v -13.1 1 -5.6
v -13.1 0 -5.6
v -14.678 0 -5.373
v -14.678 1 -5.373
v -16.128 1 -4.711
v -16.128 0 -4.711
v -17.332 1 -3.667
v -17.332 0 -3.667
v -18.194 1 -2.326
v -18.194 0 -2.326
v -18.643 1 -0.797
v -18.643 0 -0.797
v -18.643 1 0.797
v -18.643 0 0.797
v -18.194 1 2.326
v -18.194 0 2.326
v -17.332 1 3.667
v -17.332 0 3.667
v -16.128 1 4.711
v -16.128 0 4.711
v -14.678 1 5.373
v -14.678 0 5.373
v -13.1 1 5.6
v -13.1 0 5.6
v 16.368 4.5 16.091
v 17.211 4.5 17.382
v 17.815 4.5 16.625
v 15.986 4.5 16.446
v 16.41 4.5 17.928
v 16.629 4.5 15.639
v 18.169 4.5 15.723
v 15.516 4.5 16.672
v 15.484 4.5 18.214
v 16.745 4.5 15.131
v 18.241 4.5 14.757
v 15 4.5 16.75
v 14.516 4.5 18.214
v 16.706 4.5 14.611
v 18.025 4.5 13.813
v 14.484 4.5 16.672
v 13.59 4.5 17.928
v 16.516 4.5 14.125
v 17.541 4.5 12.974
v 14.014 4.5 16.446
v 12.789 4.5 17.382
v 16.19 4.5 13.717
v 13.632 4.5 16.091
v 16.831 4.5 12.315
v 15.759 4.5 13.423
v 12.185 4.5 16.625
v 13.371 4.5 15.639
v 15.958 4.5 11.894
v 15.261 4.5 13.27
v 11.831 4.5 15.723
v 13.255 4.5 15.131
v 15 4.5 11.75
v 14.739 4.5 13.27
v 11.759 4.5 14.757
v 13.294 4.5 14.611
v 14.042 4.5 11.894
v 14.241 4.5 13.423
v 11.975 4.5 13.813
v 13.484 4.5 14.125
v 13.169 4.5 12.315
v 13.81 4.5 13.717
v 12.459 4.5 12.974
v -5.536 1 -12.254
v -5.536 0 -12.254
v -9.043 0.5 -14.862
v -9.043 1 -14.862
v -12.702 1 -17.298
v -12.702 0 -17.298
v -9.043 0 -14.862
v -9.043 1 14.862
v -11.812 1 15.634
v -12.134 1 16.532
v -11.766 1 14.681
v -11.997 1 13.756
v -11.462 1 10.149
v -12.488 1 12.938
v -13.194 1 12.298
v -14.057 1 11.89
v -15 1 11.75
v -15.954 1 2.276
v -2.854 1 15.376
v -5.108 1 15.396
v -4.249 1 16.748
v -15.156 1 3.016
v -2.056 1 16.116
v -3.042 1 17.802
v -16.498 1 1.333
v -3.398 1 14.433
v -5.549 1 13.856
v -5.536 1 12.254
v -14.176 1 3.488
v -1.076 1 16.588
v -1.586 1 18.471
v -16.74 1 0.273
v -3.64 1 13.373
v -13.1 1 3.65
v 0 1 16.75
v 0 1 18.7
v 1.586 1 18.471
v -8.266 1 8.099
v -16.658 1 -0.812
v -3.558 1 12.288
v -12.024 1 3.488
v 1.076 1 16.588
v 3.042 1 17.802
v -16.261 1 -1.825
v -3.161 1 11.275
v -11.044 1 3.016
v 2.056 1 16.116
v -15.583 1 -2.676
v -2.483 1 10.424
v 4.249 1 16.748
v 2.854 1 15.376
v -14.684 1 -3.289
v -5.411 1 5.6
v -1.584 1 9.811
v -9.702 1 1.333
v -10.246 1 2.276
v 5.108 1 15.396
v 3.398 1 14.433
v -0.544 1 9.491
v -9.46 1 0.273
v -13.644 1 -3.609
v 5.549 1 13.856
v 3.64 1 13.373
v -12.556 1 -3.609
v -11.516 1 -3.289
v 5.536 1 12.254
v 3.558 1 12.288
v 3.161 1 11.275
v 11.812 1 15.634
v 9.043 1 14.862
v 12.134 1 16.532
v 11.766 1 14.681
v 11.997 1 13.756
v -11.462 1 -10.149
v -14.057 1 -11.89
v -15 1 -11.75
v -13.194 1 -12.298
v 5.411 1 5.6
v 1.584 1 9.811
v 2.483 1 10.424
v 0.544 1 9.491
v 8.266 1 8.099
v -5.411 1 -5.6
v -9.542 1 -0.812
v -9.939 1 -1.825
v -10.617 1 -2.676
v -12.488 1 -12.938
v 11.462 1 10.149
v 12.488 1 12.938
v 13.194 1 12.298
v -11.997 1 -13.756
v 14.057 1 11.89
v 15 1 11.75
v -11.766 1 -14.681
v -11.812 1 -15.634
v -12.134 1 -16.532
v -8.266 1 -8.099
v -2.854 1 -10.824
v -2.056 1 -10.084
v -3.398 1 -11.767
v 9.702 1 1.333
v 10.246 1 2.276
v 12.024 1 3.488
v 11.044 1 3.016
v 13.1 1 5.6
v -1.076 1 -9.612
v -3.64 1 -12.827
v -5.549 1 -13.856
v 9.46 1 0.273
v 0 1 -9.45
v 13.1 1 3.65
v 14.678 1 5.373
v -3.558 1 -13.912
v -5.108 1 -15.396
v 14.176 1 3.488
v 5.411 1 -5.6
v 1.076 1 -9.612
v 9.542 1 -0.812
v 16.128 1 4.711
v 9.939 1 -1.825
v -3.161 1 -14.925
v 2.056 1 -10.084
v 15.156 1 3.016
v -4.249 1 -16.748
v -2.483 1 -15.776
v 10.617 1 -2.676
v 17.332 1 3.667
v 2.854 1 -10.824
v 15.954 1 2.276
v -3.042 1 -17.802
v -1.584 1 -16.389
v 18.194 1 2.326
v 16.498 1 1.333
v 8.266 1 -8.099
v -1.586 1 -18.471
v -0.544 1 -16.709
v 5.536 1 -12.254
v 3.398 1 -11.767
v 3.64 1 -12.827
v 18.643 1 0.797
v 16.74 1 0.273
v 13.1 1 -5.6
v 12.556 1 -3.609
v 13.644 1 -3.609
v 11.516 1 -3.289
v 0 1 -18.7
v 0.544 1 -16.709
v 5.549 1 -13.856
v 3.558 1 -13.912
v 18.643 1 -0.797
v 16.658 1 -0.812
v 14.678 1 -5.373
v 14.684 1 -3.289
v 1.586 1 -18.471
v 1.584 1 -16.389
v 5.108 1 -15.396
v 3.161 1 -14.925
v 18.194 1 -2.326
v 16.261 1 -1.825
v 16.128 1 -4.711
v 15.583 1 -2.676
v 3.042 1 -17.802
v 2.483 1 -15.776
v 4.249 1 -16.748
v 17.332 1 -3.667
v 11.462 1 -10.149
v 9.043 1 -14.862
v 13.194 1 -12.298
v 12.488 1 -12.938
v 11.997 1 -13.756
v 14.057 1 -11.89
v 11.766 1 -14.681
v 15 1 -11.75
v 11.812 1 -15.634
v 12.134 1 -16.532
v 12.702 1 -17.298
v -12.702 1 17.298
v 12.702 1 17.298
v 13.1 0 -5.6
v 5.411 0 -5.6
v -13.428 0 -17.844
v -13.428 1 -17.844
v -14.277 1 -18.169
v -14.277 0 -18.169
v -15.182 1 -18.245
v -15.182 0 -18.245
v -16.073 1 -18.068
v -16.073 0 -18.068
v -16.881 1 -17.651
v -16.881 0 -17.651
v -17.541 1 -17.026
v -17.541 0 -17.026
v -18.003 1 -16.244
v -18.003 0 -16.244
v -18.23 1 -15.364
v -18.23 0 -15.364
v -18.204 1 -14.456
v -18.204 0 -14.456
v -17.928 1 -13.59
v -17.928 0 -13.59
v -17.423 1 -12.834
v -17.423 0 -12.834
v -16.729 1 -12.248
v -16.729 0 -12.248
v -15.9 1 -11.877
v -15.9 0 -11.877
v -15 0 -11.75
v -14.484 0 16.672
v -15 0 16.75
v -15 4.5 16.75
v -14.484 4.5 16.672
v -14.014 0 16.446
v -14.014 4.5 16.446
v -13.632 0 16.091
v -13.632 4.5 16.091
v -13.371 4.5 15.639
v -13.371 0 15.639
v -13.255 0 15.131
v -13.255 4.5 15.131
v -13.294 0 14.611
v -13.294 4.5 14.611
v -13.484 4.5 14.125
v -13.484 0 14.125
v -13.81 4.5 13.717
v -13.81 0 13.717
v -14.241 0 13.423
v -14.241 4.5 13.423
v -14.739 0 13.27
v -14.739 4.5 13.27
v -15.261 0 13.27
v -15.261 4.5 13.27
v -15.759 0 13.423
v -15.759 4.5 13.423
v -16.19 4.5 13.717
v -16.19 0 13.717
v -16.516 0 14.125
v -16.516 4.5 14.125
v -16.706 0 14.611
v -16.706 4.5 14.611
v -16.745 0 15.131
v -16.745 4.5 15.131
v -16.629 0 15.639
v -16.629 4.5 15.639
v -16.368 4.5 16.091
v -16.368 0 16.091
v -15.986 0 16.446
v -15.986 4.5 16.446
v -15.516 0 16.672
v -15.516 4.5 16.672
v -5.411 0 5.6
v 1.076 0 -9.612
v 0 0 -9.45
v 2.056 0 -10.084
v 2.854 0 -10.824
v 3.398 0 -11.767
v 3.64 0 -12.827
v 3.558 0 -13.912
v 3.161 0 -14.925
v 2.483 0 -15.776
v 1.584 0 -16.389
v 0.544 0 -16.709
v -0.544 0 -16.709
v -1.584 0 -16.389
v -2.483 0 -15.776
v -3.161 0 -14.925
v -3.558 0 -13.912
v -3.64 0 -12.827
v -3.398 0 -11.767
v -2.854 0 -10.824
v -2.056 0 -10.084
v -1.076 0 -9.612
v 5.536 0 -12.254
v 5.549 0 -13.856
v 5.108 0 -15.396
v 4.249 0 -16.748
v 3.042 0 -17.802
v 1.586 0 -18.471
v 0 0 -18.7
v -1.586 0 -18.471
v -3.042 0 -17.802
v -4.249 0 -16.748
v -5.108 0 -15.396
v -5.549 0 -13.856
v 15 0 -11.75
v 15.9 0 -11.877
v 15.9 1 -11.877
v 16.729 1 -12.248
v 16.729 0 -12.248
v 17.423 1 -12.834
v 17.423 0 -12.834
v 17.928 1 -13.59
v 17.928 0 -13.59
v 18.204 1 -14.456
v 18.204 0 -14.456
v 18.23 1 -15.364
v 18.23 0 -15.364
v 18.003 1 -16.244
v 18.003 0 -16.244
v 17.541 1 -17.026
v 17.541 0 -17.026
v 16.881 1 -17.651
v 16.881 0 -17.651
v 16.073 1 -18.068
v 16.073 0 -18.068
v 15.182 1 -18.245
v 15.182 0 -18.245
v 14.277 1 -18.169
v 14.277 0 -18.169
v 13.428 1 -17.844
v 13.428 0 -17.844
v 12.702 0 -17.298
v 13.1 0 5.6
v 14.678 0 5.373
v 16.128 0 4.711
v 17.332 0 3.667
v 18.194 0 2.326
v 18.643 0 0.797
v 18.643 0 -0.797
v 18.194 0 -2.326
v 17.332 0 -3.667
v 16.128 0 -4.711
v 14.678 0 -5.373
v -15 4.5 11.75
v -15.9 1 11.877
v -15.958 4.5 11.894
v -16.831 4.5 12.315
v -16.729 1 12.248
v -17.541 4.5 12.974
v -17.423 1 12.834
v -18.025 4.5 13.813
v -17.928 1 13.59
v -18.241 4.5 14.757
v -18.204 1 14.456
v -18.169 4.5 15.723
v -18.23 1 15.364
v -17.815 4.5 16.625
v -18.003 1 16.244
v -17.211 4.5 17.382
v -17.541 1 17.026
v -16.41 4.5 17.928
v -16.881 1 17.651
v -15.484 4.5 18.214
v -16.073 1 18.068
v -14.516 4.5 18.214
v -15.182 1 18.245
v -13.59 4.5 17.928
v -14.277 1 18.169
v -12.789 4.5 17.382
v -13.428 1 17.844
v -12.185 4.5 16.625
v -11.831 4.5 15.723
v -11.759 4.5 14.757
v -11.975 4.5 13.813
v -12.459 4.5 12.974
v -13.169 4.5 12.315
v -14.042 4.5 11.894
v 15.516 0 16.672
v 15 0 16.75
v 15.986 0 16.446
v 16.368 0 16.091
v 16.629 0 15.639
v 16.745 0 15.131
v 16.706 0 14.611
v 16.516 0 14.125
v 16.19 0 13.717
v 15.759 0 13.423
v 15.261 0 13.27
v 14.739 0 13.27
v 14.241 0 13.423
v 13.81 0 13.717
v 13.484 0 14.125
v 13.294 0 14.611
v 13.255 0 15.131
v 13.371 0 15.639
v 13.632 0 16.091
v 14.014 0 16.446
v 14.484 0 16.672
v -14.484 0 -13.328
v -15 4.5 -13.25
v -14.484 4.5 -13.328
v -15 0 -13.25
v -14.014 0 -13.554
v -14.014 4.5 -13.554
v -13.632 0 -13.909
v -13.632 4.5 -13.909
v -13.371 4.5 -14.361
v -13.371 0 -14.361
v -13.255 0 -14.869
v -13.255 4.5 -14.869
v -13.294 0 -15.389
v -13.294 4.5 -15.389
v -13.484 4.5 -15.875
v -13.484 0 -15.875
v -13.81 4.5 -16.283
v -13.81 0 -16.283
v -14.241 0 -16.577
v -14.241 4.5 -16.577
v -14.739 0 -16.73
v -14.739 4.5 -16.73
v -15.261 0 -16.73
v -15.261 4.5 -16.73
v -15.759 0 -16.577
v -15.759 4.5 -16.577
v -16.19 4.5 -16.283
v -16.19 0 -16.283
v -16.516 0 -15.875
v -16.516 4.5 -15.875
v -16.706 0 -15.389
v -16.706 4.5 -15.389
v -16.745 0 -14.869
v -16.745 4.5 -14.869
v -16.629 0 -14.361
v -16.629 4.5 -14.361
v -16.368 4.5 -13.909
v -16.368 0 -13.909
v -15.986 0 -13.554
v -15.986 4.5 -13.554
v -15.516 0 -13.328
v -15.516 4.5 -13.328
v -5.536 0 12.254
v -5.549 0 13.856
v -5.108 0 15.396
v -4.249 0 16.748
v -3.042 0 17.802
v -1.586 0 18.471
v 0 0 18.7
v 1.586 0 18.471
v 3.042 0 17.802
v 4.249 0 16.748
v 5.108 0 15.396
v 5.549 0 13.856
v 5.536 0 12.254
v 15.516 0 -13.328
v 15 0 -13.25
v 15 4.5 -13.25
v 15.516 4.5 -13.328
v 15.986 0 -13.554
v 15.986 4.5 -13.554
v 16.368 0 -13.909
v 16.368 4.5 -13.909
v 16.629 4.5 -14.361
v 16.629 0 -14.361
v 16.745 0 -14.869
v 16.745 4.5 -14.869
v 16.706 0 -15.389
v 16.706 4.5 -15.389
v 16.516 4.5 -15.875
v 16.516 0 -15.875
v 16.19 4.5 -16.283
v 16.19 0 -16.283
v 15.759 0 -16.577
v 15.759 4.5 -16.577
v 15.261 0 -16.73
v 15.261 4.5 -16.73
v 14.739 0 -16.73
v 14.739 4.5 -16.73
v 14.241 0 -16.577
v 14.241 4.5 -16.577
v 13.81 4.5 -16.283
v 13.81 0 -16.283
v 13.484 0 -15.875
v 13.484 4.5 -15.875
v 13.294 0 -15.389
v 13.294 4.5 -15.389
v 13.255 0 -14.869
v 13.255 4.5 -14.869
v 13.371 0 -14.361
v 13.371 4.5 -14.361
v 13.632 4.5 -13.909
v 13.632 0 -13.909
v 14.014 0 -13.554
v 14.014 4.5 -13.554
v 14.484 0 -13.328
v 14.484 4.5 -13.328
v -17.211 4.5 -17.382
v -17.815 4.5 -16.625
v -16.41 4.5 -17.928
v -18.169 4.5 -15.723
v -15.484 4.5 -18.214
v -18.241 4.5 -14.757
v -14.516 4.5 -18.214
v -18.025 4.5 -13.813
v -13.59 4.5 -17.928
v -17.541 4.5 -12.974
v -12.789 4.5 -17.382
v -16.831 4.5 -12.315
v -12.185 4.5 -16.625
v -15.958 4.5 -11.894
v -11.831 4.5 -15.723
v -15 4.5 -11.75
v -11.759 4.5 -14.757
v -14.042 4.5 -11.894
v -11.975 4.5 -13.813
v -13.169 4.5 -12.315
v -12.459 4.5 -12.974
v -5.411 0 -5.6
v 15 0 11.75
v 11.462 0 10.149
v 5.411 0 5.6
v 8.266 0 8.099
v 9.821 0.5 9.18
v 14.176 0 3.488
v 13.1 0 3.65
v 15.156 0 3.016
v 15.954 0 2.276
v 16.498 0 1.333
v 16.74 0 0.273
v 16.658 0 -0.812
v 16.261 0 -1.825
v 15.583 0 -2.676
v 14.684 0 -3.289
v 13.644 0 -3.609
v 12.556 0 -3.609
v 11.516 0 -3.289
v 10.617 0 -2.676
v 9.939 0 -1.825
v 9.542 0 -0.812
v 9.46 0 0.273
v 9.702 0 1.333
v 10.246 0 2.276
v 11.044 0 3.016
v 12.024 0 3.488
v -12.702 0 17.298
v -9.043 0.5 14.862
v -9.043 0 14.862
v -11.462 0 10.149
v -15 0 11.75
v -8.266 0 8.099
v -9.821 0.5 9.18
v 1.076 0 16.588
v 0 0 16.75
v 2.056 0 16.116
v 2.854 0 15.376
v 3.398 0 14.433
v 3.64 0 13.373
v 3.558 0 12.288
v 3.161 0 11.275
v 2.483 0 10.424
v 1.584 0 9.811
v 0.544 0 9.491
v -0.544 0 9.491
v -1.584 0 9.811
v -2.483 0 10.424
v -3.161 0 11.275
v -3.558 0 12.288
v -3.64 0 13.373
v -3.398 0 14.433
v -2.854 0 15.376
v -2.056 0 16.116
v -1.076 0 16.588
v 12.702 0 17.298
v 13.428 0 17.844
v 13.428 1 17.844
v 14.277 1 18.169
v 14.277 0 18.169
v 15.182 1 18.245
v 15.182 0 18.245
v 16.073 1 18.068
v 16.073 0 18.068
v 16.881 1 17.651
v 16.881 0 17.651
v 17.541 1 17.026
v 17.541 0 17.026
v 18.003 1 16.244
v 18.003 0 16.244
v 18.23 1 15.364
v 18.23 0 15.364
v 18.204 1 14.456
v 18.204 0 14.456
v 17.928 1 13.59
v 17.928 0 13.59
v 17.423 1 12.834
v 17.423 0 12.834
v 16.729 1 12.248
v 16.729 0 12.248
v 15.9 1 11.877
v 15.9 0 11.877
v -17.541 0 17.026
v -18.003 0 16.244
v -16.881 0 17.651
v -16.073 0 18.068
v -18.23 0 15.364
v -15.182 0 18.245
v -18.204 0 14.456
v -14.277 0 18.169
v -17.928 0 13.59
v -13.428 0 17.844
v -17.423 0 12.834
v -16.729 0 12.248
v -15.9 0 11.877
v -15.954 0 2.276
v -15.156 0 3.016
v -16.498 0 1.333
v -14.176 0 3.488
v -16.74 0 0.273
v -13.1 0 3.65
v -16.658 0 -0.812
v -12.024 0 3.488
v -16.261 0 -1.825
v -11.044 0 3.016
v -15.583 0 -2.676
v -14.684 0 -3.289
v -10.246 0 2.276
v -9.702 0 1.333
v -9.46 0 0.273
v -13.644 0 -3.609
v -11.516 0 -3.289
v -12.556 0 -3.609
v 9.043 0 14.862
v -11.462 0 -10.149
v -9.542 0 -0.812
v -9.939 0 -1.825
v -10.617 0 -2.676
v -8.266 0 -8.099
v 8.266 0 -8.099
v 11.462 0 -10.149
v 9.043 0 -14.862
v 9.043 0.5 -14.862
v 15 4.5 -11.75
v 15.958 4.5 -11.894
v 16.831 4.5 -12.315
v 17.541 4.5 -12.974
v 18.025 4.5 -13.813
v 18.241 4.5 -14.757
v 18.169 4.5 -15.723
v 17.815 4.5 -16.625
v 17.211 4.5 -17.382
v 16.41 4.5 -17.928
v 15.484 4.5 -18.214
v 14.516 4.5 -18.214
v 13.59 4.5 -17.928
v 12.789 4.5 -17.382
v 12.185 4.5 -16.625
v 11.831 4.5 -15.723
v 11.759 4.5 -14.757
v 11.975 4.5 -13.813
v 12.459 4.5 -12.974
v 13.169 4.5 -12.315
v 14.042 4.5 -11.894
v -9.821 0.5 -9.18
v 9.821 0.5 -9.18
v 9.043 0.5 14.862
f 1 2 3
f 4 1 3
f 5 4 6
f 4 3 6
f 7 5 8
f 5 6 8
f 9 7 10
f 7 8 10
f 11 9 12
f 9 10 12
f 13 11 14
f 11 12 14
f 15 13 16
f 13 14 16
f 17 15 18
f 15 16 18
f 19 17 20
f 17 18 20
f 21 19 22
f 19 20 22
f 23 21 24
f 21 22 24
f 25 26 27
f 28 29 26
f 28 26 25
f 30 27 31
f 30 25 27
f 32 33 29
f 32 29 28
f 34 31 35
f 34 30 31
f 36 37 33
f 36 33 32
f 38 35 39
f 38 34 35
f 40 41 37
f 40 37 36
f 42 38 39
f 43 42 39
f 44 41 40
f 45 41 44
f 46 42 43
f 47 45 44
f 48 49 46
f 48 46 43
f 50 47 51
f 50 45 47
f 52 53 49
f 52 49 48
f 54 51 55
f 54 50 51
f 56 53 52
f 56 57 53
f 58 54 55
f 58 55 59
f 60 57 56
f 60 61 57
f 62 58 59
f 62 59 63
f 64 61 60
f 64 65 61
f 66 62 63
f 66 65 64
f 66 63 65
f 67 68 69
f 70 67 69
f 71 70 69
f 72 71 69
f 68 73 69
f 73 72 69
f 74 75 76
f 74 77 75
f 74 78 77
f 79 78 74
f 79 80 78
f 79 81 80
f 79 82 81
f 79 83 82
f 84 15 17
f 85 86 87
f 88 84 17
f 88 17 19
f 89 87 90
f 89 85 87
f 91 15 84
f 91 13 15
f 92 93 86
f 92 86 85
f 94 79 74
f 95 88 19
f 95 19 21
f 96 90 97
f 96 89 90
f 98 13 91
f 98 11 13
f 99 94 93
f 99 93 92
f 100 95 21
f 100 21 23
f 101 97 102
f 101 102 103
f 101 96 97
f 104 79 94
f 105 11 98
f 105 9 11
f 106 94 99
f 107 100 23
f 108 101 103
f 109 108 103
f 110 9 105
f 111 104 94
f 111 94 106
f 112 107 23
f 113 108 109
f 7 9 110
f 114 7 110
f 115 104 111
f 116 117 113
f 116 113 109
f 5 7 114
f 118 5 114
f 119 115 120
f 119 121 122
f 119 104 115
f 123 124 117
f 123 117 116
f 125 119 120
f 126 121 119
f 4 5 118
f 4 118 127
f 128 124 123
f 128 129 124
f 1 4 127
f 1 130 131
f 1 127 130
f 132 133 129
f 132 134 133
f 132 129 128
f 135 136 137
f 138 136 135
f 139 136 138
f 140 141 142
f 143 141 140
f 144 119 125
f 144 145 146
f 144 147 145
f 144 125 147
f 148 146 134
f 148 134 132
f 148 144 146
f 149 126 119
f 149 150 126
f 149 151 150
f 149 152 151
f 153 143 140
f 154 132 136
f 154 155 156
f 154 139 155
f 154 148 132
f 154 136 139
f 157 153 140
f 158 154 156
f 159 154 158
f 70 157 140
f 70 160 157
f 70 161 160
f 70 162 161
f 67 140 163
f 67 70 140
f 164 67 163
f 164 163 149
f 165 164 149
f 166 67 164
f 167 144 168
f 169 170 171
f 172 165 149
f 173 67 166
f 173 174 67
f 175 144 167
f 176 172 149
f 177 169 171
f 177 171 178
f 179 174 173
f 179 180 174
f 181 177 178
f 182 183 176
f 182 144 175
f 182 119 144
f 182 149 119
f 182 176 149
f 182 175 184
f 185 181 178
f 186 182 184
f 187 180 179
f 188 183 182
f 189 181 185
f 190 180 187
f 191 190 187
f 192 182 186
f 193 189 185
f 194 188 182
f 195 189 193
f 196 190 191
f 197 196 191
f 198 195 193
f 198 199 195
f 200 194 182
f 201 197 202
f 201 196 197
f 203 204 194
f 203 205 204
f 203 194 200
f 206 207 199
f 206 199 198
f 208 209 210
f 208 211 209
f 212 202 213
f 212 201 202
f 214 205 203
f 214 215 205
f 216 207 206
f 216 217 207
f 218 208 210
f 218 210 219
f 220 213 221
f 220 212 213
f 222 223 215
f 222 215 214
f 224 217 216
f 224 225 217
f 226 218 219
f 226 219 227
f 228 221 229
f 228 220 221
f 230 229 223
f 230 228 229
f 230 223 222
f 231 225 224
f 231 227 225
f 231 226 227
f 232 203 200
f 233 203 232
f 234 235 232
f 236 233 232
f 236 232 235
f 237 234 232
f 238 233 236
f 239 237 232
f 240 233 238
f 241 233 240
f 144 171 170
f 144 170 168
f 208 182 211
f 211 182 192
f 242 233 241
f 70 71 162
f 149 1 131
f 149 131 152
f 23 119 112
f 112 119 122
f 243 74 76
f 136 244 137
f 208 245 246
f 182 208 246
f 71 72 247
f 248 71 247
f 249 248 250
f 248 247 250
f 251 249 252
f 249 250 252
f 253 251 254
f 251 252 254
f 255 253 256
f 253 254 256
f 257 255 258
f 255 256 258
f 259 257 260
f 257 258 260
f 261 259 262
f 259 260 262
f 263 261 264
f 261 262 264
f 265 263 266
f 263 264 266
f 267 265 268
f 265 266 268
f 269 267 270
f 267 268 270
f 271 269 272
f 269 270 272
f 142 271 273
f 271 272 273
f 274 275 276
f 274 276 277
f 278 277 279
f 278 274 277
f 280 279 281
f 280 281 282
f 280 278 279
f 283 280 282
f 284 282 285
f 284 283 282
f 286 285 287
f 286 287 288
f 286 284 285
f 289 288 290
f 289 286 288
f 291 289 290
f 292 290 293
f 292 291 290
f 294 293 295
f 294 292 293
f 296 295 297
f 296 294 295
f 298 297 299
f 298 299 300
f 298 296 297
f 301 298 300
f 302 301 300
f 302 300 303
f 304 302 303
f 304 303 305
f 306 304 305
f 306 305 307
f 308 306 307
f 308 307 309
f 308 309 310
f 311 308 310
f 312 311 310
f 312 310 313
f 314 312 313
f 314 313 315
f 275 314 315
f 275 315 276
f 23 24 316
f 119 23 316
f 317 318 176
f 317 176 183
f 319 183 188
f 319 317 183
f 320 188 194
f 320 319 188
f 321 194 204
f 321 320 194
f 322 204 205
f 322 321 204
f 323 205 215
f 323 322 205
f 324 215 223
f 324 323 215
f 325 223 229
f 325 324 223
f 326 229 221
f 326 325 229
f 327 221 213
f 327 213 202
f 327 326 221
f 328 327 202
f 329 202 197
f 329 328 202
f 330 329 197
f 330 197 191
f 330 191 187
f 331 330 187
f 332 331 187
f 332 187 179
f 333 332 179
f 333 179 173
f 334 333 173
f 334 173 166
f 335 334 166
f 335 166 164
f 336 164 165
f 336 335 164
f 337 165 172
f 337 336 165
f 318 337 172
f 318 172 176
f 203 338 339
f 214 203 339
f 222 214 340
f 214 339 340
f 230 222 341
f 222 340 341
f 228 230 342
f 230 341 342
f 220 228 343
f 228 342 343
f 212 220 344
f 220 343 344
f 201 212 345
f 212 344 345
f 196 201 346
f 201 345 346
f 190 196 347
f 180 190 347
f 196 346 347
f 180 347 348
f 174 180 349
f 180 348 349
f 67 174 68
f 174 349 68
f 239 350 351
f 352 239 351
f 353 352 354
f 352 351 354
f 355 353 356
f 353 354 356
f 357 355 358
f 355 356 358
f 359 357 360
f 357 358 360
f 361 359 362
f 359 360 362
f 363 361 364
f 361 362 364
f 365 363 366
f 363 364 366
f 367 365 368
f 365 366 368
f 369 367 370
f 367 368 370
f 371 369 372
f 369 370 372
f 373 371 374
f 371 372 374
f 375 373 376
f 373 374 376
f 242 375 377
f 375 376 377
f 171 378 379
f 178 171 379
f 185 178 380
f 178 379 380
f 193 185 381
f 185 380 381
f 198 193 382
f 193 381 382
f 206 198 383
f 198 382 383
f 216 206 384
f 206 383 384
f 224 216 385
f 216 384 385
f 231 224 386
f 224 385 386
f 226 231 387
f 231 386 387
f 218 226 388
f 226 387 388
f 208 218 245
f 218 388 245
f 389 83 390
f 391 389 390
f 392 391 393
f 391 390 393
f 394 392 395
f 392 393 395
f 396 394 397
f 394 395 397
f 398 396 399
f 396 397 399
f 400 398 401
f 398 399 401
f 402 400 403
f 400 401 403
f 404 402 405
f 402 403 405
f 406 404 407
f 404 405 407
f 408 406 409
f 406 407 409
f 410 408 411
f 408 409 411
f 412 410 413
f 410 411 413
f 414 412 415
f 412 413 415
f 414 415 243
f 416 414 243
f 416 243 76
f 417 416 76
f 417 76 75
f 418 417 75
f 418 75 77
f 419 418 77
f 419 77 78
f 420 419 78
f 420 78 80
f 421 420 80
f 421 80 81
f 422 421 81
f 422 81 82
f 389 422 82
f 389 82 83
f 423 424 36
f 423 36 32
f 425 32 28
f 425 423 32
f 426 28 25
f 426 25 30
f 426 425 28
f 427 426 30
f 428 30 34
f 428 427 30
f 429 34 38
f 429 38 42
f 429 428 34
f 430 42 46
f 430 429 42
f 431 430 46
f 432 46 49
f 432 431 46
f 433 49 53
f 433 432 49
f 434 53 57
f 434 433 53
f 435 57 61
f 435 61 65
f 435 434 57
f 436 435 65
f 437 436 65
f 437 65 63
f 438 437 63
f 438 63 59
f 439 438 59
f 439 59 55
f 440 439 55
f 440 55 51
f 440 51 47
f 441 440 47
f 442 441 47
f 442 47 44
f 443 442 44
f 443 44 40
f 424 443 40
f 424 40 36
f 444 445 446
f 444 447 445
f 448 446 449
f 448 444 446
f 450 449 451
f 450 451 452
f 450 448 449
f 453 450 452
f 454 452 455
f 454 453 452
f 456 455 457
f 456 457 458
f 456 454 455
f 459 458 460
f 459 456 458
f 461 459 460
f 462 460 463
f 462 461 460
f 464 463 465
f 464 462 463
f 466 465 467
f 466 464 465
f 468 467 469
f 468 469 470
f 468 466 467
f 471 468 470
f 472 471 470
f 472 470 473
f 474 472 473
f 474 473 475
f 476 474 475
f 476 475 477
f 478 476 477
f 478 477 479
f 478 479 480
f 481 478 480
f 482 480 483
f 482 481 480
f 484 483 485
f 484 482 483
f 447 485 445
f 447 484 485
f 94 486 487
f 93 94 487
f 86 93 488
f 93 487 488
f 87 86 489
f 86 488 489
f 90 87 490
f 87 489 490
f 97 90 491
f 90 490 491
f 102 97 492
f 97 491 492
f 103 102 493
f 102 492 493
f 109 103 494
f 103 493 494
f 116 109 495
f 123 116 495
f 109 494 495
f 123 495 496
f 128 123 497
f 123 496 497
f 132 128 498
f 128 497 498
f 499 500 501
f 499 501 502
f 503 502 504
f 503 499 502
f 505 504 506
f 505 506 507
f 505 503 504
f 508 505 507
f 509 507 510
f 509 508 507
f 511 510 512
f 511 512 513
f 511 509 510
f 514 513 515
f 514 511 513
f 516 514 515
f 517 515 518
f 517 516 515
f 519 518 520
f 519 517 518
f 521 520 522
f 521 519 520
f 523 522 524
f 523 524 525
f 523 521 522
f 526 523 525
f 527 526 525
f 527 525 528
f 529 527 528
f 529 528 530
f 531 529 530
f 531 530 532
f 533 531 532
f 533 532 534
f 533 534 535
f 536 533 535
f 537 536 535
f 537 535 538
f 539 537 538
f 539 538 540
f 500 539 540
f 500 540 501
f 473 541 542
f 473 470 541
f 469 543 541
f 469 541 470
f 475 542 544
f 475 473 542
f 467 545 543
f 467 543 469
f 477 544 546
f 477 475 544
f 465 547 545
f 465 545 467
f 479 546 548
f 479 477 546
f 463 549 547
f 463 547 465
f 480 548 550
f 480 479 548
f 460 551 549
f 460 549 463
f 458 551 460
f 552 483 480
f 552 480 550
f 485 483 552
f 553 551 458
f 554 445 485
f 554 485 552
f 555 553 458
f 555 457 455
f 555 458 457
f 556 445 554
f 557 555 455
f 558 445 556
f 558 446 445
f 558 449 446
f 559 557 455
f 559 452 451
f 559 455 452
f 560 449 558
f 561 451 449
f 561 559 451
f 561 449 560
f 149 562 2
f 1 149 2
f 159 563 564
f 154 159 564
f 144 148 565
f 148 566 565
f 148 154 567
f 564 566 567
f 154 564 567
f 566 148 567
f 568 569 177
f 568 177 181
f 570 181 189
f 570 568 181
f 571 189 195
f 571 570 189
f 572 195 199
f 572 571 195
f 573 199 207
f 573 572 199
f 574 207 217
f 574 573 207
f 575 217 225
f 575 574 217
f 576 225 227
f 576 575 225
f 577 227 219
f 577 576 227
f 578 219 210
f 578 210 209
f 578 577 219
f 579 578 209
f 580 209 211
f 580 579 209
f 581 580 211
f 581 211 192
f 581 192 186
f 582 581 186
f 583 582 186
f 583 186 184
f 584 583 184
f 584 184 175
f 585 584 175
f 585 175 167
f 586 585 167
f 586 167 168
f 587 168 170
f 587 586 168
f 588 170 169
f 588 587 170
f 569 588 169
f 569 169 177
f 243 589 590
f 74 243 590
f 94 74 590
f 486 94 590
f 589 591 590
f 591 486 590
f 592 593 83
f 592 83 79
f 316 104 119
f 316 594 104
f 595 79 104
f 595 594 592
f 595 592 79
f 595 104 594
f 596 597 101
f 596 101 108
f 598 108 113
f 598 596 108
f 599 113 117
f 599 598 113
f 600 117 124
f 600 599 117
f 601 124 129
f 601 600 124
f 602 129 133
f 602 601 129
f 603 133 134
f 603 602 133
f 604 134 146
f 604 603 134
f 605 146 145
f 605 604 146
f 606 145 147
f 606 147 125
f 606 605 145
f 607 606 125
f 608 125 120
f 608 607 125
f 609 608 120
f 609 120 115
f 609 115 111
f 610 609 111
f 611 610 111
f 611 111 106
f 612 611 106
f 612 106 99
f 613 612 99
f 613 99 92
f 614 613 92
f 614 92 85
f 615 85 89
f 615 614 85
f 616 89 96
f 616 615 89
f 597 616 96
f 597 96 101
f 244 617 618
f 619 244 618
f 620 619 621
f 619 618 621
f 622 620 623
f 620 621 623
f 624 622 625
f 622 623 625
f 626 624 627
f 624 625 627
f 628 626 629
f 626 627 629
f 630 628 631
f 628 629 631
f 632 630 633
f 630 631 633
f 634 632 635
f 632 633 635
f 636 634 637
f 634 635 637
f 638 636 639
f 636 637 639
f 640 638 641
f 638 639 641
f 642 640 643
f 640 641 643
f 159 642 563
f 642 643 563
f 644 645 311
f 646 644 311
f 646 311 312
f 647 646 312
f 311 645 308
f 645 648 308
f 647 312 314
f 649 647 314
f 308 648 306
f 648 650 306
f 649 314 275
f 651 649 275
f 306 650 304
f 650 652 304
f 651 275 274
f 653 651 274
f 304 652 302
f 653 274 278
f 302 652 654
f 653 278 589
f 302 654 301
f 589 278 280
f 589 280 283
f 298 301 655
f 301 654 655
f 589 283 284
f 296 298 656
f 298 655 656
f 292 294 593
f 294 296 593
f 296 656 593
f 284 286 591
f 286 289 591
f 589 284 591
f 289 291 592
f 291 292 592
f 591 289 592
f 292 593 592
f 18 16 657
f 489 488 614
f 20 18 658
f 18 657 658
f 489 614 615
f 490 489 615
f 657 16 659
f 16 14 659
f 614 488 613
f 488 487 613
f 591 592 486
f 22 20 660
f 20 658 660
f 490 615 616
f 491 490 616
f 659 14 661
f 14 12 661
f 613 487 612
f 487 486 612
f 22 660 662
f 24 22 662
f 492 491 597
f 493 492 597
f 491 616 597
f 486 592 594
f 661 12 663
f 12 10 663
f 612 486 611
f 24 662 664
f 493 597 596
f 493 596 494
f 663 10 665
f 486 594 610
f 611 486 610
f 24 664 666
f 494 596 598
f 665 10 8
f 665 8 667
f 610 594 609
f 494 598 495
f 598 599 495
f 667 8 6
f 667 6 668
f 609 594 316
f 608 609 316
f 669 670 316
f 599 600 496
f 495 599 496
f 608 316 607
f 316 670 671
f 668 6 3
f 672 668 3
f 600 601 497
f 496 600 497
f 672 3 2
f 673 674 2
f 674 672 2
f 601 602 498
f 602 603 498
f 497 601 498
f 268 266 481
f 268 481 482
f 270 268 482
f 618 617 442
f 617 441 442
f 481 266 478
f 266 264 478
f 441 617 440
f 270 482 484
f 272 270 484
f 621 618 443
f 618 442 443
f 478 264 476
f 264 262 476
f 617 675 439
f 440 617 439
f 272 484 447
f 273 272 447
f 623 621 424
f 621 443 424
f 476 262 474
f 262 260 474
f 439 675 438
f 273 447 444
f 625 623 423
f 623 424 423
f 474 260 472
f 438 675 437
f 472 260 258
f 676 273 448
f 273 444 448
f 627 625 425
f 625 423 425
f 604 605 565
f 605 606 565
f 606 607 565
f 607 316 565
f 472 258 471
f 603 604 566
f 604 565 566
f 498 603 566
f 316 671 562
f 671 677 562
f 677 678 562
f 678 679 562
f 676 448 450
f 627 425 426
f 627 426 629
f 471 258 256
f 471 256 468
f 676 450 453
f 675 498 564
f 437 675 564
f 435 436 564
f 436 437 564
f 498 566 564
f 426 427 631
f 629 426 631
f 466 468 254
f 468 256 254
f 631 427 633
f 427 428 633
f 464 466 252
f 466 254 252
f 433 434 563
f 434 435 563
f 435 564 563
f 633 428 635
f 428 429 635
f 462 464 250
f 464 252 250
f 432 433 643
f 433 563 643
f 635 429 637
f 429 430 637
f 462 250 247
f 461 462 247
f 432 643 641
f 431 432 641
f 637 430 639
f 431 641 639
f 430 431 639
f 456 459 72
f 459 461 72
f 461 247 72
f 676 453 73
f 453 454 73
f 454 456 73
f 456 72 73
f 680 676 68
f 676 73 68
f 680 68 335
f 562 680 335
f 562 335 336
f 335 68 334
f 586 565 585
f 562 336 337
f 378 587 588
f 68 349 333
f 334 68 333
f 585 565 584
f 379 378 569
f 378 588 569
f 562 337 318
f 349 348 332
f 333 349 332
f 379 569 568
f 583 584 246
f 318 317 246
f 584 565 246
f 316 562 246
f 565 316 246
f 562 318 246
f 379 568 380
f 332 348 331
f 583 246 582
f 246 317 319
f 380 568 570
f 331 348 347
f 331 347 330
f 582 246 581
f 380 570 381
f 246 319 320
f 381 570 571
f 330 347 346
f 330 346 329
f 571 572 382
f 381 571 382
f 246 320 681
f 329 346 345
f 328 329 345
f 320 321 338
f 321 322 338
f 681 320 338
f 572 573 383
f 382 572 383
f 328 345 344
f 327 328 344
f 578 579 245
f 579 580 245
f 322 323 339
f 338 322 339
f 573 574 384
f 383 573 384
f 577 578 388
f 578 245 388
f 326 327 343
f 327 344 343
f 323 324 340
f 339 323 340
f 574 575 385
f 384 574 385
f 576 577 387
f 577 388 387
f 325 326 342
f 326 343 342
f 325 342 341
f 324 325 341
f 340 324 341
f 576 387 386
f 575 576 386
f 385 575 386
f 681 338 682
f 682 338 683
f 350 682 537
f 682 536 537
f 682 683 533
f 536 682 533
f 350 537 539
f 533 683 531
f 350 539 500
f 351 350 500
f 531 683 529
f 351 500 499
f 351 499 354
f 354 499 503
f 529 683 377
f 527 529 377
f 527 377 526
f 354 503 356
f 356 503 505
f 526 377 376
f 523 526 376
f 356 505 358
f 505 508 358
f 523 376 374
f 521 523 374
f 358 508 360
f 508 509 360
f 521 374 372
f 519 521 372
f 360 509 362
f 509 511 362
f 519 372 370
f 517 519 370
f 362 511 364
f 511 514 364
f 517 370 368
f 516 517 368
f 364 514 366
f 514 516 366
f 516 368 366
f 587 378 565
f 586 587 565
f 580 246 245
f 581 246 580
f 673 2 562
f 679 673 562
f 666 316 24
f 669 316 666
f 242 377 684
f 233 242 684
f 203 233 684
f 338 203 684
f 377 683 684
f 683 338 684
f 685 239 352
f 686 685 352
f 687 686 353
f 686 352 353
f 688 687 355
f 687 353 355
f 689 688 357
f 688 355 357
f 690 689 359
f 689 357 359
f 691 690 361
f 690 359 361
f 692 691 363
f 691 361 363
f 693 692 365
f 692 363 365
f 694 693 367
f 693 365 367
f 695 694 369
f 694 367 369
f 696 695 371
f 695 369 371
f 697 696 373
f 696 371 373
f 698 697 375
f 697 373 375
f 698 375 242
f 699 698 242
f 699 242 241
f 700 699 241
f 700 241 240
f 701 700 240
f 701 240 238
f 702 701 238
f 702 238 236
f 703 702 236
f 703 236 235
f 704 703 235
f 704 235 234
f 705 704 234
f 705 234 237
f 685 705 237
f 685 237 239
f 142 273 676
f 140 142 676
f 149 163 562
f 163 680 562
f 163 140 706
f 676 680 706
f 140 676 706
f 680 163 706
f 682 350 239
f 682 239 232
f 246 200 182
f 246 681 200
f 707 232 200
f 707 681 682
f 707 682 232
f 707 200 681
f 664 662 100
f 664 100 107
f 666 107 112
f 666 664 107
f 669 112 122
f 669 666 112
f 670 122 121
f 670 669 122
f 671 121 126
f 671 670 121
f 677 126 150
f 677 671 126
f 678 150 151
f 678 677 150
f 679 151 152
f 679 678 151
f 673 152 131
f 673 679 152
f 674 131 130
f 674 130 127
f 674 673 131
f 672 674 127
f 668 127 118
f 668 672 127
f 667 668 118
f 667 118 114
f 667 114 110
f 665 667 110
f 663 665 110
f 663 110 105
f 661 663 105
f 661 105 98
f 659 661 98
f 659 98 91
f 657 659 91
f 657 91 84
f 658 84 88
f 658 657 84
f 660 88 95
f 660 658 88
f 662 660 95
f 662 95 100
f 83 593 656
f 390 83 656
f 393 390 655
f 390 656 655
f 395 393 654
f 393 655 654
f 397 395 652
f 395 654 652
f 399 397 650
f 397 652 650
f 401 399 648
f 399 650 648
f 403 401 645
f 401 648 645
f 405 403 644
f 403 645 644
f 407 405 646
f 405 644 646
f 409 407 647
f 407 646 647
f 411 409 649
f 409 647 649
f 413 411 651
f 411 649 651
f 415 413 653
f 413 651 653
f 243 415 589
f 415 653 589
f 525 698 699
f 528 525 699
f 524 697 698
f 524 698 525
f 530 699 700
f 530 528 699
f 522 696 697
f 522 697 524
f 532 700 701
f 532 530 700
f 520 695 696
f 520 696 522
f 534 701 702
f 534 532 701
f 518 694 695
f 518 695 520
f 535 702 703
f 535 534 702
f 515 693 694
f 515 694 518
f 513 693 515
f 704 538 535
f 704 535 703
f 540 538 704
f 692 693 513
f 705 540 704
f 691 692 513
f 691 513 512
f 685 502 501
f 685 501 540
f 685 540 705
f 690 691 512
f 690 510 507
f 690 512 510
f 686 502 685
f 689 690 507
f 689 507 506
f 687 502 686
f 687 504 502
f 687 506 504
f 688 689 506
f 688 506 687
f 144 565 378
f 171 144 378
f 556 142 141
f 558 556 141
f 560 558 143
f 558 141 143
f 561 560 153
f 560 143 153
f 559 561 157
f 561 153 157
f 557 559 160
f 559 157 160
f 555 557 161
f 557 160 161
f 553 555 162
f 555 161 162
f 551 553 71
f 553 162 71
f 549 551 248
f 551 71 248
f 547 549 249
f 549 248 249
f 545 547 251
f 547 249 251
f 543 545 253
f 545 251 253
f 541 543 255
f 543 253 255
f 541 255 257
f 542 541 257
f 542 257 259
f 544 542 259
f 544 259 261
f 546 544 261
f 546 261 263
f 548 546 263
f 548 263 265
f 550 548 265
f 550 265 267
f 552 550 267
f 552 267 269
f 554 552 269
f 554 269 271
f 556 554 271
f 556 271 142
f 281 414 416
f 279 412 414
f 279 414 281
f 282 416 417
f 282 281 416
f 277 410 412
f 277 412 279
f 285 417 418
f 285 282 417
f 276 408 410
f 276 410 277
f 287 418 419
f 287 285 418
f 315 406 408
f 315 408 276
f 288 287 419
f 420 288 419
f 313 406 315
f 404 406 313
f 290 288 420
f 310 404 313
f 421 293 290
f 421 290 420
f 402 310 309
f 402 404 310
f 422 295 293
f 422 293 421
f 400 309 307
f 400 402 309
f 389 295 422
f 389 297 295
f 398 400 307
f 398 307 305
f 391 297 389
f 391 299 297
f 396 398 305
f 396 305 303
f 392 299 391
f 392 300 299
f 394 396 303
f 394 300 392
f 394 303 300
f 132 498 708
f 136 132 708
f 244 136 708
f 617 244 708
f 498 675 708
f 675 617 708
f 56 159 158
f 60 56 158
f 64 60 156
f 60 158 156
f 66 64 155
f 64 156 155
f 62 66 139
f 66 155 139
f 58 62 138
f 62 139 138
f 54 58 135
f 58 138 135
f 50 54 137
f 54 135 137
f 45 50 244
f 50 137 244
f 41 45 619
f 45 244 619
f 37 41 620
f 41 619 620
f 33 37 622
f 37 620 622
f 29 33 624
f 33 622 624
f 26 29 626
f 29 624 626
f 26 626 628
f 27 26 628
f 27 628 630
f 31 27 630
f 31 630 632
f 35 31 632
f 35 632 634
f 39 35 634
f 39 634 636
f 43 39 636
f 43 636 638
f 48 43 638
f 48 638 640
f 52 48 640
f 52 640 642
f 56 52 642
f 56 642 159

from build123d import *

# Parameters (mm, degrees)
SKETCH1_R           = 3.65
SKETCH1_R_2         = 1.75
BOSS_EXTRUDE1_DEPTH = 1
SKETCH2_R           = 3.25
SKETCH2_R_2         = 1.75
BOSS_EXTRUDE2_DEPTH = 3.5


with BuildPart() as part:
    # Sketch1 → Boss-Extrude1 (new body)
    with BuildSketch(Plane(origin=(0, 0, 0), x_dir=(1, 0, 0), z_dir=(0, 1, 0))):
        with BuildLine():
            Line((5.410568808, -5.6), (13.1, -5.6))
            ThreePointArc((13.1, -5.6), (18.7, 0), (13.1, 5.6))
            Line((13.1, 5.6), (5.410568808, 5.6))
            add(Edge.make_bspline(
                [(15, 11.75), (9.437012866, 9.684618997), (5.410568808, 5.6)],
                knots=[0, 0, 0, 0.823024689, 0.823024689, 0.823024689], degree=2))
            ThreePointArc((15, 11.75), (18.002608481, 16.243721155), (12.701902961, 17.298097039))
            add(Edge.make_bspline(
                [(12.701902961, 17.298097039), (8.967561343, 14.947817201), (5.535660126, 12.253556278)],
                knots=[0, 0, 0, 0.409026758, 0.409026758, 0.409026758], degree=2))
            ThreePointArc((5.535660126, 12.253556278), (0, 18.7), (-5.535660126, 12.253556278))
            add(Edge.make_bspline(
                [(-5.535660126, 12.253556278), (-8.967561343, 14.947817201), (-12.701902961, 17.298097039)],
                knots=[0.751545437, 0.751545437, 0.751545437, 1.160572194, 1.160572194, 1.160572194], degree=2))
            ThreePointArc((-12.701902961, 17.298097039), (-18.002608481, 16.243721155), (-15, 11.75))
            add(Edge.make_bspline(
                [(-15, 11.75), (-9.437012866, 9.684618997), (-5.410568808, 5.6)],
                knots=[0, 0, 0, 0.823024689, 0.823024689, 0.823024689], degree=2))
            Line((-5.410568808, 5.6), (-13.1, 5.6))
            ThreePointArc((-13.1, 5.6), (-18.7, 0), (-13.1, -5.6))
            Line((-13.1, -5.6), (-5.410568808, -5.6))
            add(Edge.make_bspline(
                [(-15, -11.75), (-9.437012866, -9.684618997), (-5.410568808, -5.6)],
                knots=[0, 0, 0, 0.823024689, 0.823024689, 0.823024689], degree=2))
            ThreePointArc((-15, -11.75), (-18.002608481, -16.243721155), (-12.701902961, -17.298097039))
            add(Edge.make_bspline(
                [(-12.701902961, -17.298097039), (-8.967561343, -14.947817201), (-5.535660126, -12.253556278)],
                knots=[0, 0, 0, 0.409026758, 0.409026758, 0.409026758], degree=2))
            ThreePointArc((-5.535660126, -12.253556278), (0, -18.7), (5.535660126, -12.253556278))
            add(Edge.make_bspline(
                [(5.535660126, -12.253556278), (8.967561343, -14.947817201), (12.701902961, -17.298097039)],
                knots=[0.751545437, 0.751545437, 0.751545437, 1.160572194, 1.160572194, 1.160572194], degree=2))
            ThreePointArc((12.701902961, -17.298097039), (18.002608481, -16.243721155), (15, -11.75))
            add(Edge.make_bspline(
                [(15, -11.75), (9.437012866, -9.684618997), (5.410568808, -5.6)],
                knots=[0, 0, 0, 0.823024689, 0.823024689, 0.823024689], degree=2))
        make_face()
        with Locations(Location((0, 13.1, 0), (0, 0, 270))):
            Circle(SKETCH1_R, mode=Mode.SUBTRACT)
        with Locations(Location((0, -13.1, 0), (0, 0, 270))):
            Circle(SKETCH1_R, mode=Mode.SUBTRACT)
        with Locations(Location((13.1, 0, 0), (0, 0, 270))):
            Circle(SKETCH1_R, mode=Mode.SUBTRACT)
        with Locations(Location((15, 15, 0), (0, 0, 270))):
            Circle(SKETCH1_R_2, mode=Mode.SUBTRACT)
        with Locations(Location((-13.1, 0, 0), (0, 0, 270))):
            Circle(SKETCH1_R, mode=Mode.SUBTRACT)
        with Locations(Location((-15, 15, 0), (0, 0, 270))):
            Circle(SKETCH1_R_2, mode=Mode.SUBTRACT)
        with Locations(Location((15, -15, 0), (0, 0, 270))):
            Circle(SKETCH1_R_2, mode=Mode.SUBTRACT)
        with Locations(Location((-15, -15, 0), (0, 0, 270))):
            Circle(SKETCH1_R_2, mode=Mode.SUBTRACT)
    extrude(amount=BOSS_EXTRUDE1_DEPTH)

    # Sketch2 → Boss-Extrude2 (add)
    # profile 1 of 4: a face of its own
    with BuildSketch(Plane(origin=(0, 1, 0), x_dir=(1, 0, 0), z_dir=(0, 1, 0))):
        with Locations(Location((-15, 15, 0), (0, 0, 270))):
            Circle(SKETCH2_R)
        with Locations(Location((-15, 15, 0), (0, 0, 270))):
            Circle(SKETCH2_R_2, mode=Mode.SUBTRACT)
    # profile 2 of 4: a face of its own
    with BuildSketch(Plane(origin=(0, 1, 0), x_dir=(1, 0, 0), z_dir=(0, 1, 0))):
        with Locations(Location((15, 15, 0), (0, 0, 270))):
            Circle(SKETCH2_R)
        with Locations(Location((15, 15, 0), (0, 0, 270))):
            Circle(SKETCH2_R_2, mode=Mode.SUBTRACT)
    # profile 3 of 4: a face of its own
    with BuildSketch(Plane(origin=(0, 1, 0), x_dir=(1, 0, 0), z_dir=(0, 1, 0))):
        with Locations(Location((15, -15, 0), (0, 0, 90))):
            Circle(SKETCH2_R)
        with Locations(Location((15, -15, 0), (0, 0, 270))):
            Circle(SKETCH2_R_2, mode=Mode.SUBTRACT)
    # profile 4 of 4: a face of its own
    with BuildSketch(Plane(origin=(0, 1, 0), x_dir=(1, 0, 0), z_dir=(0, 1, 0))):
        with Locations(Location((-15, -15, 0), (0, 0, 90))):
            Circle(SKETCH2_R)
        with Locations(Location((-15, -15, 0), (0, 0, 270))):
            Circle(SKETCH2_R_2, mode=Mode.SUBTRACT)
    extrude(amount=BOSS_EXTRUDE2_DEPTH)


solid = part.part
